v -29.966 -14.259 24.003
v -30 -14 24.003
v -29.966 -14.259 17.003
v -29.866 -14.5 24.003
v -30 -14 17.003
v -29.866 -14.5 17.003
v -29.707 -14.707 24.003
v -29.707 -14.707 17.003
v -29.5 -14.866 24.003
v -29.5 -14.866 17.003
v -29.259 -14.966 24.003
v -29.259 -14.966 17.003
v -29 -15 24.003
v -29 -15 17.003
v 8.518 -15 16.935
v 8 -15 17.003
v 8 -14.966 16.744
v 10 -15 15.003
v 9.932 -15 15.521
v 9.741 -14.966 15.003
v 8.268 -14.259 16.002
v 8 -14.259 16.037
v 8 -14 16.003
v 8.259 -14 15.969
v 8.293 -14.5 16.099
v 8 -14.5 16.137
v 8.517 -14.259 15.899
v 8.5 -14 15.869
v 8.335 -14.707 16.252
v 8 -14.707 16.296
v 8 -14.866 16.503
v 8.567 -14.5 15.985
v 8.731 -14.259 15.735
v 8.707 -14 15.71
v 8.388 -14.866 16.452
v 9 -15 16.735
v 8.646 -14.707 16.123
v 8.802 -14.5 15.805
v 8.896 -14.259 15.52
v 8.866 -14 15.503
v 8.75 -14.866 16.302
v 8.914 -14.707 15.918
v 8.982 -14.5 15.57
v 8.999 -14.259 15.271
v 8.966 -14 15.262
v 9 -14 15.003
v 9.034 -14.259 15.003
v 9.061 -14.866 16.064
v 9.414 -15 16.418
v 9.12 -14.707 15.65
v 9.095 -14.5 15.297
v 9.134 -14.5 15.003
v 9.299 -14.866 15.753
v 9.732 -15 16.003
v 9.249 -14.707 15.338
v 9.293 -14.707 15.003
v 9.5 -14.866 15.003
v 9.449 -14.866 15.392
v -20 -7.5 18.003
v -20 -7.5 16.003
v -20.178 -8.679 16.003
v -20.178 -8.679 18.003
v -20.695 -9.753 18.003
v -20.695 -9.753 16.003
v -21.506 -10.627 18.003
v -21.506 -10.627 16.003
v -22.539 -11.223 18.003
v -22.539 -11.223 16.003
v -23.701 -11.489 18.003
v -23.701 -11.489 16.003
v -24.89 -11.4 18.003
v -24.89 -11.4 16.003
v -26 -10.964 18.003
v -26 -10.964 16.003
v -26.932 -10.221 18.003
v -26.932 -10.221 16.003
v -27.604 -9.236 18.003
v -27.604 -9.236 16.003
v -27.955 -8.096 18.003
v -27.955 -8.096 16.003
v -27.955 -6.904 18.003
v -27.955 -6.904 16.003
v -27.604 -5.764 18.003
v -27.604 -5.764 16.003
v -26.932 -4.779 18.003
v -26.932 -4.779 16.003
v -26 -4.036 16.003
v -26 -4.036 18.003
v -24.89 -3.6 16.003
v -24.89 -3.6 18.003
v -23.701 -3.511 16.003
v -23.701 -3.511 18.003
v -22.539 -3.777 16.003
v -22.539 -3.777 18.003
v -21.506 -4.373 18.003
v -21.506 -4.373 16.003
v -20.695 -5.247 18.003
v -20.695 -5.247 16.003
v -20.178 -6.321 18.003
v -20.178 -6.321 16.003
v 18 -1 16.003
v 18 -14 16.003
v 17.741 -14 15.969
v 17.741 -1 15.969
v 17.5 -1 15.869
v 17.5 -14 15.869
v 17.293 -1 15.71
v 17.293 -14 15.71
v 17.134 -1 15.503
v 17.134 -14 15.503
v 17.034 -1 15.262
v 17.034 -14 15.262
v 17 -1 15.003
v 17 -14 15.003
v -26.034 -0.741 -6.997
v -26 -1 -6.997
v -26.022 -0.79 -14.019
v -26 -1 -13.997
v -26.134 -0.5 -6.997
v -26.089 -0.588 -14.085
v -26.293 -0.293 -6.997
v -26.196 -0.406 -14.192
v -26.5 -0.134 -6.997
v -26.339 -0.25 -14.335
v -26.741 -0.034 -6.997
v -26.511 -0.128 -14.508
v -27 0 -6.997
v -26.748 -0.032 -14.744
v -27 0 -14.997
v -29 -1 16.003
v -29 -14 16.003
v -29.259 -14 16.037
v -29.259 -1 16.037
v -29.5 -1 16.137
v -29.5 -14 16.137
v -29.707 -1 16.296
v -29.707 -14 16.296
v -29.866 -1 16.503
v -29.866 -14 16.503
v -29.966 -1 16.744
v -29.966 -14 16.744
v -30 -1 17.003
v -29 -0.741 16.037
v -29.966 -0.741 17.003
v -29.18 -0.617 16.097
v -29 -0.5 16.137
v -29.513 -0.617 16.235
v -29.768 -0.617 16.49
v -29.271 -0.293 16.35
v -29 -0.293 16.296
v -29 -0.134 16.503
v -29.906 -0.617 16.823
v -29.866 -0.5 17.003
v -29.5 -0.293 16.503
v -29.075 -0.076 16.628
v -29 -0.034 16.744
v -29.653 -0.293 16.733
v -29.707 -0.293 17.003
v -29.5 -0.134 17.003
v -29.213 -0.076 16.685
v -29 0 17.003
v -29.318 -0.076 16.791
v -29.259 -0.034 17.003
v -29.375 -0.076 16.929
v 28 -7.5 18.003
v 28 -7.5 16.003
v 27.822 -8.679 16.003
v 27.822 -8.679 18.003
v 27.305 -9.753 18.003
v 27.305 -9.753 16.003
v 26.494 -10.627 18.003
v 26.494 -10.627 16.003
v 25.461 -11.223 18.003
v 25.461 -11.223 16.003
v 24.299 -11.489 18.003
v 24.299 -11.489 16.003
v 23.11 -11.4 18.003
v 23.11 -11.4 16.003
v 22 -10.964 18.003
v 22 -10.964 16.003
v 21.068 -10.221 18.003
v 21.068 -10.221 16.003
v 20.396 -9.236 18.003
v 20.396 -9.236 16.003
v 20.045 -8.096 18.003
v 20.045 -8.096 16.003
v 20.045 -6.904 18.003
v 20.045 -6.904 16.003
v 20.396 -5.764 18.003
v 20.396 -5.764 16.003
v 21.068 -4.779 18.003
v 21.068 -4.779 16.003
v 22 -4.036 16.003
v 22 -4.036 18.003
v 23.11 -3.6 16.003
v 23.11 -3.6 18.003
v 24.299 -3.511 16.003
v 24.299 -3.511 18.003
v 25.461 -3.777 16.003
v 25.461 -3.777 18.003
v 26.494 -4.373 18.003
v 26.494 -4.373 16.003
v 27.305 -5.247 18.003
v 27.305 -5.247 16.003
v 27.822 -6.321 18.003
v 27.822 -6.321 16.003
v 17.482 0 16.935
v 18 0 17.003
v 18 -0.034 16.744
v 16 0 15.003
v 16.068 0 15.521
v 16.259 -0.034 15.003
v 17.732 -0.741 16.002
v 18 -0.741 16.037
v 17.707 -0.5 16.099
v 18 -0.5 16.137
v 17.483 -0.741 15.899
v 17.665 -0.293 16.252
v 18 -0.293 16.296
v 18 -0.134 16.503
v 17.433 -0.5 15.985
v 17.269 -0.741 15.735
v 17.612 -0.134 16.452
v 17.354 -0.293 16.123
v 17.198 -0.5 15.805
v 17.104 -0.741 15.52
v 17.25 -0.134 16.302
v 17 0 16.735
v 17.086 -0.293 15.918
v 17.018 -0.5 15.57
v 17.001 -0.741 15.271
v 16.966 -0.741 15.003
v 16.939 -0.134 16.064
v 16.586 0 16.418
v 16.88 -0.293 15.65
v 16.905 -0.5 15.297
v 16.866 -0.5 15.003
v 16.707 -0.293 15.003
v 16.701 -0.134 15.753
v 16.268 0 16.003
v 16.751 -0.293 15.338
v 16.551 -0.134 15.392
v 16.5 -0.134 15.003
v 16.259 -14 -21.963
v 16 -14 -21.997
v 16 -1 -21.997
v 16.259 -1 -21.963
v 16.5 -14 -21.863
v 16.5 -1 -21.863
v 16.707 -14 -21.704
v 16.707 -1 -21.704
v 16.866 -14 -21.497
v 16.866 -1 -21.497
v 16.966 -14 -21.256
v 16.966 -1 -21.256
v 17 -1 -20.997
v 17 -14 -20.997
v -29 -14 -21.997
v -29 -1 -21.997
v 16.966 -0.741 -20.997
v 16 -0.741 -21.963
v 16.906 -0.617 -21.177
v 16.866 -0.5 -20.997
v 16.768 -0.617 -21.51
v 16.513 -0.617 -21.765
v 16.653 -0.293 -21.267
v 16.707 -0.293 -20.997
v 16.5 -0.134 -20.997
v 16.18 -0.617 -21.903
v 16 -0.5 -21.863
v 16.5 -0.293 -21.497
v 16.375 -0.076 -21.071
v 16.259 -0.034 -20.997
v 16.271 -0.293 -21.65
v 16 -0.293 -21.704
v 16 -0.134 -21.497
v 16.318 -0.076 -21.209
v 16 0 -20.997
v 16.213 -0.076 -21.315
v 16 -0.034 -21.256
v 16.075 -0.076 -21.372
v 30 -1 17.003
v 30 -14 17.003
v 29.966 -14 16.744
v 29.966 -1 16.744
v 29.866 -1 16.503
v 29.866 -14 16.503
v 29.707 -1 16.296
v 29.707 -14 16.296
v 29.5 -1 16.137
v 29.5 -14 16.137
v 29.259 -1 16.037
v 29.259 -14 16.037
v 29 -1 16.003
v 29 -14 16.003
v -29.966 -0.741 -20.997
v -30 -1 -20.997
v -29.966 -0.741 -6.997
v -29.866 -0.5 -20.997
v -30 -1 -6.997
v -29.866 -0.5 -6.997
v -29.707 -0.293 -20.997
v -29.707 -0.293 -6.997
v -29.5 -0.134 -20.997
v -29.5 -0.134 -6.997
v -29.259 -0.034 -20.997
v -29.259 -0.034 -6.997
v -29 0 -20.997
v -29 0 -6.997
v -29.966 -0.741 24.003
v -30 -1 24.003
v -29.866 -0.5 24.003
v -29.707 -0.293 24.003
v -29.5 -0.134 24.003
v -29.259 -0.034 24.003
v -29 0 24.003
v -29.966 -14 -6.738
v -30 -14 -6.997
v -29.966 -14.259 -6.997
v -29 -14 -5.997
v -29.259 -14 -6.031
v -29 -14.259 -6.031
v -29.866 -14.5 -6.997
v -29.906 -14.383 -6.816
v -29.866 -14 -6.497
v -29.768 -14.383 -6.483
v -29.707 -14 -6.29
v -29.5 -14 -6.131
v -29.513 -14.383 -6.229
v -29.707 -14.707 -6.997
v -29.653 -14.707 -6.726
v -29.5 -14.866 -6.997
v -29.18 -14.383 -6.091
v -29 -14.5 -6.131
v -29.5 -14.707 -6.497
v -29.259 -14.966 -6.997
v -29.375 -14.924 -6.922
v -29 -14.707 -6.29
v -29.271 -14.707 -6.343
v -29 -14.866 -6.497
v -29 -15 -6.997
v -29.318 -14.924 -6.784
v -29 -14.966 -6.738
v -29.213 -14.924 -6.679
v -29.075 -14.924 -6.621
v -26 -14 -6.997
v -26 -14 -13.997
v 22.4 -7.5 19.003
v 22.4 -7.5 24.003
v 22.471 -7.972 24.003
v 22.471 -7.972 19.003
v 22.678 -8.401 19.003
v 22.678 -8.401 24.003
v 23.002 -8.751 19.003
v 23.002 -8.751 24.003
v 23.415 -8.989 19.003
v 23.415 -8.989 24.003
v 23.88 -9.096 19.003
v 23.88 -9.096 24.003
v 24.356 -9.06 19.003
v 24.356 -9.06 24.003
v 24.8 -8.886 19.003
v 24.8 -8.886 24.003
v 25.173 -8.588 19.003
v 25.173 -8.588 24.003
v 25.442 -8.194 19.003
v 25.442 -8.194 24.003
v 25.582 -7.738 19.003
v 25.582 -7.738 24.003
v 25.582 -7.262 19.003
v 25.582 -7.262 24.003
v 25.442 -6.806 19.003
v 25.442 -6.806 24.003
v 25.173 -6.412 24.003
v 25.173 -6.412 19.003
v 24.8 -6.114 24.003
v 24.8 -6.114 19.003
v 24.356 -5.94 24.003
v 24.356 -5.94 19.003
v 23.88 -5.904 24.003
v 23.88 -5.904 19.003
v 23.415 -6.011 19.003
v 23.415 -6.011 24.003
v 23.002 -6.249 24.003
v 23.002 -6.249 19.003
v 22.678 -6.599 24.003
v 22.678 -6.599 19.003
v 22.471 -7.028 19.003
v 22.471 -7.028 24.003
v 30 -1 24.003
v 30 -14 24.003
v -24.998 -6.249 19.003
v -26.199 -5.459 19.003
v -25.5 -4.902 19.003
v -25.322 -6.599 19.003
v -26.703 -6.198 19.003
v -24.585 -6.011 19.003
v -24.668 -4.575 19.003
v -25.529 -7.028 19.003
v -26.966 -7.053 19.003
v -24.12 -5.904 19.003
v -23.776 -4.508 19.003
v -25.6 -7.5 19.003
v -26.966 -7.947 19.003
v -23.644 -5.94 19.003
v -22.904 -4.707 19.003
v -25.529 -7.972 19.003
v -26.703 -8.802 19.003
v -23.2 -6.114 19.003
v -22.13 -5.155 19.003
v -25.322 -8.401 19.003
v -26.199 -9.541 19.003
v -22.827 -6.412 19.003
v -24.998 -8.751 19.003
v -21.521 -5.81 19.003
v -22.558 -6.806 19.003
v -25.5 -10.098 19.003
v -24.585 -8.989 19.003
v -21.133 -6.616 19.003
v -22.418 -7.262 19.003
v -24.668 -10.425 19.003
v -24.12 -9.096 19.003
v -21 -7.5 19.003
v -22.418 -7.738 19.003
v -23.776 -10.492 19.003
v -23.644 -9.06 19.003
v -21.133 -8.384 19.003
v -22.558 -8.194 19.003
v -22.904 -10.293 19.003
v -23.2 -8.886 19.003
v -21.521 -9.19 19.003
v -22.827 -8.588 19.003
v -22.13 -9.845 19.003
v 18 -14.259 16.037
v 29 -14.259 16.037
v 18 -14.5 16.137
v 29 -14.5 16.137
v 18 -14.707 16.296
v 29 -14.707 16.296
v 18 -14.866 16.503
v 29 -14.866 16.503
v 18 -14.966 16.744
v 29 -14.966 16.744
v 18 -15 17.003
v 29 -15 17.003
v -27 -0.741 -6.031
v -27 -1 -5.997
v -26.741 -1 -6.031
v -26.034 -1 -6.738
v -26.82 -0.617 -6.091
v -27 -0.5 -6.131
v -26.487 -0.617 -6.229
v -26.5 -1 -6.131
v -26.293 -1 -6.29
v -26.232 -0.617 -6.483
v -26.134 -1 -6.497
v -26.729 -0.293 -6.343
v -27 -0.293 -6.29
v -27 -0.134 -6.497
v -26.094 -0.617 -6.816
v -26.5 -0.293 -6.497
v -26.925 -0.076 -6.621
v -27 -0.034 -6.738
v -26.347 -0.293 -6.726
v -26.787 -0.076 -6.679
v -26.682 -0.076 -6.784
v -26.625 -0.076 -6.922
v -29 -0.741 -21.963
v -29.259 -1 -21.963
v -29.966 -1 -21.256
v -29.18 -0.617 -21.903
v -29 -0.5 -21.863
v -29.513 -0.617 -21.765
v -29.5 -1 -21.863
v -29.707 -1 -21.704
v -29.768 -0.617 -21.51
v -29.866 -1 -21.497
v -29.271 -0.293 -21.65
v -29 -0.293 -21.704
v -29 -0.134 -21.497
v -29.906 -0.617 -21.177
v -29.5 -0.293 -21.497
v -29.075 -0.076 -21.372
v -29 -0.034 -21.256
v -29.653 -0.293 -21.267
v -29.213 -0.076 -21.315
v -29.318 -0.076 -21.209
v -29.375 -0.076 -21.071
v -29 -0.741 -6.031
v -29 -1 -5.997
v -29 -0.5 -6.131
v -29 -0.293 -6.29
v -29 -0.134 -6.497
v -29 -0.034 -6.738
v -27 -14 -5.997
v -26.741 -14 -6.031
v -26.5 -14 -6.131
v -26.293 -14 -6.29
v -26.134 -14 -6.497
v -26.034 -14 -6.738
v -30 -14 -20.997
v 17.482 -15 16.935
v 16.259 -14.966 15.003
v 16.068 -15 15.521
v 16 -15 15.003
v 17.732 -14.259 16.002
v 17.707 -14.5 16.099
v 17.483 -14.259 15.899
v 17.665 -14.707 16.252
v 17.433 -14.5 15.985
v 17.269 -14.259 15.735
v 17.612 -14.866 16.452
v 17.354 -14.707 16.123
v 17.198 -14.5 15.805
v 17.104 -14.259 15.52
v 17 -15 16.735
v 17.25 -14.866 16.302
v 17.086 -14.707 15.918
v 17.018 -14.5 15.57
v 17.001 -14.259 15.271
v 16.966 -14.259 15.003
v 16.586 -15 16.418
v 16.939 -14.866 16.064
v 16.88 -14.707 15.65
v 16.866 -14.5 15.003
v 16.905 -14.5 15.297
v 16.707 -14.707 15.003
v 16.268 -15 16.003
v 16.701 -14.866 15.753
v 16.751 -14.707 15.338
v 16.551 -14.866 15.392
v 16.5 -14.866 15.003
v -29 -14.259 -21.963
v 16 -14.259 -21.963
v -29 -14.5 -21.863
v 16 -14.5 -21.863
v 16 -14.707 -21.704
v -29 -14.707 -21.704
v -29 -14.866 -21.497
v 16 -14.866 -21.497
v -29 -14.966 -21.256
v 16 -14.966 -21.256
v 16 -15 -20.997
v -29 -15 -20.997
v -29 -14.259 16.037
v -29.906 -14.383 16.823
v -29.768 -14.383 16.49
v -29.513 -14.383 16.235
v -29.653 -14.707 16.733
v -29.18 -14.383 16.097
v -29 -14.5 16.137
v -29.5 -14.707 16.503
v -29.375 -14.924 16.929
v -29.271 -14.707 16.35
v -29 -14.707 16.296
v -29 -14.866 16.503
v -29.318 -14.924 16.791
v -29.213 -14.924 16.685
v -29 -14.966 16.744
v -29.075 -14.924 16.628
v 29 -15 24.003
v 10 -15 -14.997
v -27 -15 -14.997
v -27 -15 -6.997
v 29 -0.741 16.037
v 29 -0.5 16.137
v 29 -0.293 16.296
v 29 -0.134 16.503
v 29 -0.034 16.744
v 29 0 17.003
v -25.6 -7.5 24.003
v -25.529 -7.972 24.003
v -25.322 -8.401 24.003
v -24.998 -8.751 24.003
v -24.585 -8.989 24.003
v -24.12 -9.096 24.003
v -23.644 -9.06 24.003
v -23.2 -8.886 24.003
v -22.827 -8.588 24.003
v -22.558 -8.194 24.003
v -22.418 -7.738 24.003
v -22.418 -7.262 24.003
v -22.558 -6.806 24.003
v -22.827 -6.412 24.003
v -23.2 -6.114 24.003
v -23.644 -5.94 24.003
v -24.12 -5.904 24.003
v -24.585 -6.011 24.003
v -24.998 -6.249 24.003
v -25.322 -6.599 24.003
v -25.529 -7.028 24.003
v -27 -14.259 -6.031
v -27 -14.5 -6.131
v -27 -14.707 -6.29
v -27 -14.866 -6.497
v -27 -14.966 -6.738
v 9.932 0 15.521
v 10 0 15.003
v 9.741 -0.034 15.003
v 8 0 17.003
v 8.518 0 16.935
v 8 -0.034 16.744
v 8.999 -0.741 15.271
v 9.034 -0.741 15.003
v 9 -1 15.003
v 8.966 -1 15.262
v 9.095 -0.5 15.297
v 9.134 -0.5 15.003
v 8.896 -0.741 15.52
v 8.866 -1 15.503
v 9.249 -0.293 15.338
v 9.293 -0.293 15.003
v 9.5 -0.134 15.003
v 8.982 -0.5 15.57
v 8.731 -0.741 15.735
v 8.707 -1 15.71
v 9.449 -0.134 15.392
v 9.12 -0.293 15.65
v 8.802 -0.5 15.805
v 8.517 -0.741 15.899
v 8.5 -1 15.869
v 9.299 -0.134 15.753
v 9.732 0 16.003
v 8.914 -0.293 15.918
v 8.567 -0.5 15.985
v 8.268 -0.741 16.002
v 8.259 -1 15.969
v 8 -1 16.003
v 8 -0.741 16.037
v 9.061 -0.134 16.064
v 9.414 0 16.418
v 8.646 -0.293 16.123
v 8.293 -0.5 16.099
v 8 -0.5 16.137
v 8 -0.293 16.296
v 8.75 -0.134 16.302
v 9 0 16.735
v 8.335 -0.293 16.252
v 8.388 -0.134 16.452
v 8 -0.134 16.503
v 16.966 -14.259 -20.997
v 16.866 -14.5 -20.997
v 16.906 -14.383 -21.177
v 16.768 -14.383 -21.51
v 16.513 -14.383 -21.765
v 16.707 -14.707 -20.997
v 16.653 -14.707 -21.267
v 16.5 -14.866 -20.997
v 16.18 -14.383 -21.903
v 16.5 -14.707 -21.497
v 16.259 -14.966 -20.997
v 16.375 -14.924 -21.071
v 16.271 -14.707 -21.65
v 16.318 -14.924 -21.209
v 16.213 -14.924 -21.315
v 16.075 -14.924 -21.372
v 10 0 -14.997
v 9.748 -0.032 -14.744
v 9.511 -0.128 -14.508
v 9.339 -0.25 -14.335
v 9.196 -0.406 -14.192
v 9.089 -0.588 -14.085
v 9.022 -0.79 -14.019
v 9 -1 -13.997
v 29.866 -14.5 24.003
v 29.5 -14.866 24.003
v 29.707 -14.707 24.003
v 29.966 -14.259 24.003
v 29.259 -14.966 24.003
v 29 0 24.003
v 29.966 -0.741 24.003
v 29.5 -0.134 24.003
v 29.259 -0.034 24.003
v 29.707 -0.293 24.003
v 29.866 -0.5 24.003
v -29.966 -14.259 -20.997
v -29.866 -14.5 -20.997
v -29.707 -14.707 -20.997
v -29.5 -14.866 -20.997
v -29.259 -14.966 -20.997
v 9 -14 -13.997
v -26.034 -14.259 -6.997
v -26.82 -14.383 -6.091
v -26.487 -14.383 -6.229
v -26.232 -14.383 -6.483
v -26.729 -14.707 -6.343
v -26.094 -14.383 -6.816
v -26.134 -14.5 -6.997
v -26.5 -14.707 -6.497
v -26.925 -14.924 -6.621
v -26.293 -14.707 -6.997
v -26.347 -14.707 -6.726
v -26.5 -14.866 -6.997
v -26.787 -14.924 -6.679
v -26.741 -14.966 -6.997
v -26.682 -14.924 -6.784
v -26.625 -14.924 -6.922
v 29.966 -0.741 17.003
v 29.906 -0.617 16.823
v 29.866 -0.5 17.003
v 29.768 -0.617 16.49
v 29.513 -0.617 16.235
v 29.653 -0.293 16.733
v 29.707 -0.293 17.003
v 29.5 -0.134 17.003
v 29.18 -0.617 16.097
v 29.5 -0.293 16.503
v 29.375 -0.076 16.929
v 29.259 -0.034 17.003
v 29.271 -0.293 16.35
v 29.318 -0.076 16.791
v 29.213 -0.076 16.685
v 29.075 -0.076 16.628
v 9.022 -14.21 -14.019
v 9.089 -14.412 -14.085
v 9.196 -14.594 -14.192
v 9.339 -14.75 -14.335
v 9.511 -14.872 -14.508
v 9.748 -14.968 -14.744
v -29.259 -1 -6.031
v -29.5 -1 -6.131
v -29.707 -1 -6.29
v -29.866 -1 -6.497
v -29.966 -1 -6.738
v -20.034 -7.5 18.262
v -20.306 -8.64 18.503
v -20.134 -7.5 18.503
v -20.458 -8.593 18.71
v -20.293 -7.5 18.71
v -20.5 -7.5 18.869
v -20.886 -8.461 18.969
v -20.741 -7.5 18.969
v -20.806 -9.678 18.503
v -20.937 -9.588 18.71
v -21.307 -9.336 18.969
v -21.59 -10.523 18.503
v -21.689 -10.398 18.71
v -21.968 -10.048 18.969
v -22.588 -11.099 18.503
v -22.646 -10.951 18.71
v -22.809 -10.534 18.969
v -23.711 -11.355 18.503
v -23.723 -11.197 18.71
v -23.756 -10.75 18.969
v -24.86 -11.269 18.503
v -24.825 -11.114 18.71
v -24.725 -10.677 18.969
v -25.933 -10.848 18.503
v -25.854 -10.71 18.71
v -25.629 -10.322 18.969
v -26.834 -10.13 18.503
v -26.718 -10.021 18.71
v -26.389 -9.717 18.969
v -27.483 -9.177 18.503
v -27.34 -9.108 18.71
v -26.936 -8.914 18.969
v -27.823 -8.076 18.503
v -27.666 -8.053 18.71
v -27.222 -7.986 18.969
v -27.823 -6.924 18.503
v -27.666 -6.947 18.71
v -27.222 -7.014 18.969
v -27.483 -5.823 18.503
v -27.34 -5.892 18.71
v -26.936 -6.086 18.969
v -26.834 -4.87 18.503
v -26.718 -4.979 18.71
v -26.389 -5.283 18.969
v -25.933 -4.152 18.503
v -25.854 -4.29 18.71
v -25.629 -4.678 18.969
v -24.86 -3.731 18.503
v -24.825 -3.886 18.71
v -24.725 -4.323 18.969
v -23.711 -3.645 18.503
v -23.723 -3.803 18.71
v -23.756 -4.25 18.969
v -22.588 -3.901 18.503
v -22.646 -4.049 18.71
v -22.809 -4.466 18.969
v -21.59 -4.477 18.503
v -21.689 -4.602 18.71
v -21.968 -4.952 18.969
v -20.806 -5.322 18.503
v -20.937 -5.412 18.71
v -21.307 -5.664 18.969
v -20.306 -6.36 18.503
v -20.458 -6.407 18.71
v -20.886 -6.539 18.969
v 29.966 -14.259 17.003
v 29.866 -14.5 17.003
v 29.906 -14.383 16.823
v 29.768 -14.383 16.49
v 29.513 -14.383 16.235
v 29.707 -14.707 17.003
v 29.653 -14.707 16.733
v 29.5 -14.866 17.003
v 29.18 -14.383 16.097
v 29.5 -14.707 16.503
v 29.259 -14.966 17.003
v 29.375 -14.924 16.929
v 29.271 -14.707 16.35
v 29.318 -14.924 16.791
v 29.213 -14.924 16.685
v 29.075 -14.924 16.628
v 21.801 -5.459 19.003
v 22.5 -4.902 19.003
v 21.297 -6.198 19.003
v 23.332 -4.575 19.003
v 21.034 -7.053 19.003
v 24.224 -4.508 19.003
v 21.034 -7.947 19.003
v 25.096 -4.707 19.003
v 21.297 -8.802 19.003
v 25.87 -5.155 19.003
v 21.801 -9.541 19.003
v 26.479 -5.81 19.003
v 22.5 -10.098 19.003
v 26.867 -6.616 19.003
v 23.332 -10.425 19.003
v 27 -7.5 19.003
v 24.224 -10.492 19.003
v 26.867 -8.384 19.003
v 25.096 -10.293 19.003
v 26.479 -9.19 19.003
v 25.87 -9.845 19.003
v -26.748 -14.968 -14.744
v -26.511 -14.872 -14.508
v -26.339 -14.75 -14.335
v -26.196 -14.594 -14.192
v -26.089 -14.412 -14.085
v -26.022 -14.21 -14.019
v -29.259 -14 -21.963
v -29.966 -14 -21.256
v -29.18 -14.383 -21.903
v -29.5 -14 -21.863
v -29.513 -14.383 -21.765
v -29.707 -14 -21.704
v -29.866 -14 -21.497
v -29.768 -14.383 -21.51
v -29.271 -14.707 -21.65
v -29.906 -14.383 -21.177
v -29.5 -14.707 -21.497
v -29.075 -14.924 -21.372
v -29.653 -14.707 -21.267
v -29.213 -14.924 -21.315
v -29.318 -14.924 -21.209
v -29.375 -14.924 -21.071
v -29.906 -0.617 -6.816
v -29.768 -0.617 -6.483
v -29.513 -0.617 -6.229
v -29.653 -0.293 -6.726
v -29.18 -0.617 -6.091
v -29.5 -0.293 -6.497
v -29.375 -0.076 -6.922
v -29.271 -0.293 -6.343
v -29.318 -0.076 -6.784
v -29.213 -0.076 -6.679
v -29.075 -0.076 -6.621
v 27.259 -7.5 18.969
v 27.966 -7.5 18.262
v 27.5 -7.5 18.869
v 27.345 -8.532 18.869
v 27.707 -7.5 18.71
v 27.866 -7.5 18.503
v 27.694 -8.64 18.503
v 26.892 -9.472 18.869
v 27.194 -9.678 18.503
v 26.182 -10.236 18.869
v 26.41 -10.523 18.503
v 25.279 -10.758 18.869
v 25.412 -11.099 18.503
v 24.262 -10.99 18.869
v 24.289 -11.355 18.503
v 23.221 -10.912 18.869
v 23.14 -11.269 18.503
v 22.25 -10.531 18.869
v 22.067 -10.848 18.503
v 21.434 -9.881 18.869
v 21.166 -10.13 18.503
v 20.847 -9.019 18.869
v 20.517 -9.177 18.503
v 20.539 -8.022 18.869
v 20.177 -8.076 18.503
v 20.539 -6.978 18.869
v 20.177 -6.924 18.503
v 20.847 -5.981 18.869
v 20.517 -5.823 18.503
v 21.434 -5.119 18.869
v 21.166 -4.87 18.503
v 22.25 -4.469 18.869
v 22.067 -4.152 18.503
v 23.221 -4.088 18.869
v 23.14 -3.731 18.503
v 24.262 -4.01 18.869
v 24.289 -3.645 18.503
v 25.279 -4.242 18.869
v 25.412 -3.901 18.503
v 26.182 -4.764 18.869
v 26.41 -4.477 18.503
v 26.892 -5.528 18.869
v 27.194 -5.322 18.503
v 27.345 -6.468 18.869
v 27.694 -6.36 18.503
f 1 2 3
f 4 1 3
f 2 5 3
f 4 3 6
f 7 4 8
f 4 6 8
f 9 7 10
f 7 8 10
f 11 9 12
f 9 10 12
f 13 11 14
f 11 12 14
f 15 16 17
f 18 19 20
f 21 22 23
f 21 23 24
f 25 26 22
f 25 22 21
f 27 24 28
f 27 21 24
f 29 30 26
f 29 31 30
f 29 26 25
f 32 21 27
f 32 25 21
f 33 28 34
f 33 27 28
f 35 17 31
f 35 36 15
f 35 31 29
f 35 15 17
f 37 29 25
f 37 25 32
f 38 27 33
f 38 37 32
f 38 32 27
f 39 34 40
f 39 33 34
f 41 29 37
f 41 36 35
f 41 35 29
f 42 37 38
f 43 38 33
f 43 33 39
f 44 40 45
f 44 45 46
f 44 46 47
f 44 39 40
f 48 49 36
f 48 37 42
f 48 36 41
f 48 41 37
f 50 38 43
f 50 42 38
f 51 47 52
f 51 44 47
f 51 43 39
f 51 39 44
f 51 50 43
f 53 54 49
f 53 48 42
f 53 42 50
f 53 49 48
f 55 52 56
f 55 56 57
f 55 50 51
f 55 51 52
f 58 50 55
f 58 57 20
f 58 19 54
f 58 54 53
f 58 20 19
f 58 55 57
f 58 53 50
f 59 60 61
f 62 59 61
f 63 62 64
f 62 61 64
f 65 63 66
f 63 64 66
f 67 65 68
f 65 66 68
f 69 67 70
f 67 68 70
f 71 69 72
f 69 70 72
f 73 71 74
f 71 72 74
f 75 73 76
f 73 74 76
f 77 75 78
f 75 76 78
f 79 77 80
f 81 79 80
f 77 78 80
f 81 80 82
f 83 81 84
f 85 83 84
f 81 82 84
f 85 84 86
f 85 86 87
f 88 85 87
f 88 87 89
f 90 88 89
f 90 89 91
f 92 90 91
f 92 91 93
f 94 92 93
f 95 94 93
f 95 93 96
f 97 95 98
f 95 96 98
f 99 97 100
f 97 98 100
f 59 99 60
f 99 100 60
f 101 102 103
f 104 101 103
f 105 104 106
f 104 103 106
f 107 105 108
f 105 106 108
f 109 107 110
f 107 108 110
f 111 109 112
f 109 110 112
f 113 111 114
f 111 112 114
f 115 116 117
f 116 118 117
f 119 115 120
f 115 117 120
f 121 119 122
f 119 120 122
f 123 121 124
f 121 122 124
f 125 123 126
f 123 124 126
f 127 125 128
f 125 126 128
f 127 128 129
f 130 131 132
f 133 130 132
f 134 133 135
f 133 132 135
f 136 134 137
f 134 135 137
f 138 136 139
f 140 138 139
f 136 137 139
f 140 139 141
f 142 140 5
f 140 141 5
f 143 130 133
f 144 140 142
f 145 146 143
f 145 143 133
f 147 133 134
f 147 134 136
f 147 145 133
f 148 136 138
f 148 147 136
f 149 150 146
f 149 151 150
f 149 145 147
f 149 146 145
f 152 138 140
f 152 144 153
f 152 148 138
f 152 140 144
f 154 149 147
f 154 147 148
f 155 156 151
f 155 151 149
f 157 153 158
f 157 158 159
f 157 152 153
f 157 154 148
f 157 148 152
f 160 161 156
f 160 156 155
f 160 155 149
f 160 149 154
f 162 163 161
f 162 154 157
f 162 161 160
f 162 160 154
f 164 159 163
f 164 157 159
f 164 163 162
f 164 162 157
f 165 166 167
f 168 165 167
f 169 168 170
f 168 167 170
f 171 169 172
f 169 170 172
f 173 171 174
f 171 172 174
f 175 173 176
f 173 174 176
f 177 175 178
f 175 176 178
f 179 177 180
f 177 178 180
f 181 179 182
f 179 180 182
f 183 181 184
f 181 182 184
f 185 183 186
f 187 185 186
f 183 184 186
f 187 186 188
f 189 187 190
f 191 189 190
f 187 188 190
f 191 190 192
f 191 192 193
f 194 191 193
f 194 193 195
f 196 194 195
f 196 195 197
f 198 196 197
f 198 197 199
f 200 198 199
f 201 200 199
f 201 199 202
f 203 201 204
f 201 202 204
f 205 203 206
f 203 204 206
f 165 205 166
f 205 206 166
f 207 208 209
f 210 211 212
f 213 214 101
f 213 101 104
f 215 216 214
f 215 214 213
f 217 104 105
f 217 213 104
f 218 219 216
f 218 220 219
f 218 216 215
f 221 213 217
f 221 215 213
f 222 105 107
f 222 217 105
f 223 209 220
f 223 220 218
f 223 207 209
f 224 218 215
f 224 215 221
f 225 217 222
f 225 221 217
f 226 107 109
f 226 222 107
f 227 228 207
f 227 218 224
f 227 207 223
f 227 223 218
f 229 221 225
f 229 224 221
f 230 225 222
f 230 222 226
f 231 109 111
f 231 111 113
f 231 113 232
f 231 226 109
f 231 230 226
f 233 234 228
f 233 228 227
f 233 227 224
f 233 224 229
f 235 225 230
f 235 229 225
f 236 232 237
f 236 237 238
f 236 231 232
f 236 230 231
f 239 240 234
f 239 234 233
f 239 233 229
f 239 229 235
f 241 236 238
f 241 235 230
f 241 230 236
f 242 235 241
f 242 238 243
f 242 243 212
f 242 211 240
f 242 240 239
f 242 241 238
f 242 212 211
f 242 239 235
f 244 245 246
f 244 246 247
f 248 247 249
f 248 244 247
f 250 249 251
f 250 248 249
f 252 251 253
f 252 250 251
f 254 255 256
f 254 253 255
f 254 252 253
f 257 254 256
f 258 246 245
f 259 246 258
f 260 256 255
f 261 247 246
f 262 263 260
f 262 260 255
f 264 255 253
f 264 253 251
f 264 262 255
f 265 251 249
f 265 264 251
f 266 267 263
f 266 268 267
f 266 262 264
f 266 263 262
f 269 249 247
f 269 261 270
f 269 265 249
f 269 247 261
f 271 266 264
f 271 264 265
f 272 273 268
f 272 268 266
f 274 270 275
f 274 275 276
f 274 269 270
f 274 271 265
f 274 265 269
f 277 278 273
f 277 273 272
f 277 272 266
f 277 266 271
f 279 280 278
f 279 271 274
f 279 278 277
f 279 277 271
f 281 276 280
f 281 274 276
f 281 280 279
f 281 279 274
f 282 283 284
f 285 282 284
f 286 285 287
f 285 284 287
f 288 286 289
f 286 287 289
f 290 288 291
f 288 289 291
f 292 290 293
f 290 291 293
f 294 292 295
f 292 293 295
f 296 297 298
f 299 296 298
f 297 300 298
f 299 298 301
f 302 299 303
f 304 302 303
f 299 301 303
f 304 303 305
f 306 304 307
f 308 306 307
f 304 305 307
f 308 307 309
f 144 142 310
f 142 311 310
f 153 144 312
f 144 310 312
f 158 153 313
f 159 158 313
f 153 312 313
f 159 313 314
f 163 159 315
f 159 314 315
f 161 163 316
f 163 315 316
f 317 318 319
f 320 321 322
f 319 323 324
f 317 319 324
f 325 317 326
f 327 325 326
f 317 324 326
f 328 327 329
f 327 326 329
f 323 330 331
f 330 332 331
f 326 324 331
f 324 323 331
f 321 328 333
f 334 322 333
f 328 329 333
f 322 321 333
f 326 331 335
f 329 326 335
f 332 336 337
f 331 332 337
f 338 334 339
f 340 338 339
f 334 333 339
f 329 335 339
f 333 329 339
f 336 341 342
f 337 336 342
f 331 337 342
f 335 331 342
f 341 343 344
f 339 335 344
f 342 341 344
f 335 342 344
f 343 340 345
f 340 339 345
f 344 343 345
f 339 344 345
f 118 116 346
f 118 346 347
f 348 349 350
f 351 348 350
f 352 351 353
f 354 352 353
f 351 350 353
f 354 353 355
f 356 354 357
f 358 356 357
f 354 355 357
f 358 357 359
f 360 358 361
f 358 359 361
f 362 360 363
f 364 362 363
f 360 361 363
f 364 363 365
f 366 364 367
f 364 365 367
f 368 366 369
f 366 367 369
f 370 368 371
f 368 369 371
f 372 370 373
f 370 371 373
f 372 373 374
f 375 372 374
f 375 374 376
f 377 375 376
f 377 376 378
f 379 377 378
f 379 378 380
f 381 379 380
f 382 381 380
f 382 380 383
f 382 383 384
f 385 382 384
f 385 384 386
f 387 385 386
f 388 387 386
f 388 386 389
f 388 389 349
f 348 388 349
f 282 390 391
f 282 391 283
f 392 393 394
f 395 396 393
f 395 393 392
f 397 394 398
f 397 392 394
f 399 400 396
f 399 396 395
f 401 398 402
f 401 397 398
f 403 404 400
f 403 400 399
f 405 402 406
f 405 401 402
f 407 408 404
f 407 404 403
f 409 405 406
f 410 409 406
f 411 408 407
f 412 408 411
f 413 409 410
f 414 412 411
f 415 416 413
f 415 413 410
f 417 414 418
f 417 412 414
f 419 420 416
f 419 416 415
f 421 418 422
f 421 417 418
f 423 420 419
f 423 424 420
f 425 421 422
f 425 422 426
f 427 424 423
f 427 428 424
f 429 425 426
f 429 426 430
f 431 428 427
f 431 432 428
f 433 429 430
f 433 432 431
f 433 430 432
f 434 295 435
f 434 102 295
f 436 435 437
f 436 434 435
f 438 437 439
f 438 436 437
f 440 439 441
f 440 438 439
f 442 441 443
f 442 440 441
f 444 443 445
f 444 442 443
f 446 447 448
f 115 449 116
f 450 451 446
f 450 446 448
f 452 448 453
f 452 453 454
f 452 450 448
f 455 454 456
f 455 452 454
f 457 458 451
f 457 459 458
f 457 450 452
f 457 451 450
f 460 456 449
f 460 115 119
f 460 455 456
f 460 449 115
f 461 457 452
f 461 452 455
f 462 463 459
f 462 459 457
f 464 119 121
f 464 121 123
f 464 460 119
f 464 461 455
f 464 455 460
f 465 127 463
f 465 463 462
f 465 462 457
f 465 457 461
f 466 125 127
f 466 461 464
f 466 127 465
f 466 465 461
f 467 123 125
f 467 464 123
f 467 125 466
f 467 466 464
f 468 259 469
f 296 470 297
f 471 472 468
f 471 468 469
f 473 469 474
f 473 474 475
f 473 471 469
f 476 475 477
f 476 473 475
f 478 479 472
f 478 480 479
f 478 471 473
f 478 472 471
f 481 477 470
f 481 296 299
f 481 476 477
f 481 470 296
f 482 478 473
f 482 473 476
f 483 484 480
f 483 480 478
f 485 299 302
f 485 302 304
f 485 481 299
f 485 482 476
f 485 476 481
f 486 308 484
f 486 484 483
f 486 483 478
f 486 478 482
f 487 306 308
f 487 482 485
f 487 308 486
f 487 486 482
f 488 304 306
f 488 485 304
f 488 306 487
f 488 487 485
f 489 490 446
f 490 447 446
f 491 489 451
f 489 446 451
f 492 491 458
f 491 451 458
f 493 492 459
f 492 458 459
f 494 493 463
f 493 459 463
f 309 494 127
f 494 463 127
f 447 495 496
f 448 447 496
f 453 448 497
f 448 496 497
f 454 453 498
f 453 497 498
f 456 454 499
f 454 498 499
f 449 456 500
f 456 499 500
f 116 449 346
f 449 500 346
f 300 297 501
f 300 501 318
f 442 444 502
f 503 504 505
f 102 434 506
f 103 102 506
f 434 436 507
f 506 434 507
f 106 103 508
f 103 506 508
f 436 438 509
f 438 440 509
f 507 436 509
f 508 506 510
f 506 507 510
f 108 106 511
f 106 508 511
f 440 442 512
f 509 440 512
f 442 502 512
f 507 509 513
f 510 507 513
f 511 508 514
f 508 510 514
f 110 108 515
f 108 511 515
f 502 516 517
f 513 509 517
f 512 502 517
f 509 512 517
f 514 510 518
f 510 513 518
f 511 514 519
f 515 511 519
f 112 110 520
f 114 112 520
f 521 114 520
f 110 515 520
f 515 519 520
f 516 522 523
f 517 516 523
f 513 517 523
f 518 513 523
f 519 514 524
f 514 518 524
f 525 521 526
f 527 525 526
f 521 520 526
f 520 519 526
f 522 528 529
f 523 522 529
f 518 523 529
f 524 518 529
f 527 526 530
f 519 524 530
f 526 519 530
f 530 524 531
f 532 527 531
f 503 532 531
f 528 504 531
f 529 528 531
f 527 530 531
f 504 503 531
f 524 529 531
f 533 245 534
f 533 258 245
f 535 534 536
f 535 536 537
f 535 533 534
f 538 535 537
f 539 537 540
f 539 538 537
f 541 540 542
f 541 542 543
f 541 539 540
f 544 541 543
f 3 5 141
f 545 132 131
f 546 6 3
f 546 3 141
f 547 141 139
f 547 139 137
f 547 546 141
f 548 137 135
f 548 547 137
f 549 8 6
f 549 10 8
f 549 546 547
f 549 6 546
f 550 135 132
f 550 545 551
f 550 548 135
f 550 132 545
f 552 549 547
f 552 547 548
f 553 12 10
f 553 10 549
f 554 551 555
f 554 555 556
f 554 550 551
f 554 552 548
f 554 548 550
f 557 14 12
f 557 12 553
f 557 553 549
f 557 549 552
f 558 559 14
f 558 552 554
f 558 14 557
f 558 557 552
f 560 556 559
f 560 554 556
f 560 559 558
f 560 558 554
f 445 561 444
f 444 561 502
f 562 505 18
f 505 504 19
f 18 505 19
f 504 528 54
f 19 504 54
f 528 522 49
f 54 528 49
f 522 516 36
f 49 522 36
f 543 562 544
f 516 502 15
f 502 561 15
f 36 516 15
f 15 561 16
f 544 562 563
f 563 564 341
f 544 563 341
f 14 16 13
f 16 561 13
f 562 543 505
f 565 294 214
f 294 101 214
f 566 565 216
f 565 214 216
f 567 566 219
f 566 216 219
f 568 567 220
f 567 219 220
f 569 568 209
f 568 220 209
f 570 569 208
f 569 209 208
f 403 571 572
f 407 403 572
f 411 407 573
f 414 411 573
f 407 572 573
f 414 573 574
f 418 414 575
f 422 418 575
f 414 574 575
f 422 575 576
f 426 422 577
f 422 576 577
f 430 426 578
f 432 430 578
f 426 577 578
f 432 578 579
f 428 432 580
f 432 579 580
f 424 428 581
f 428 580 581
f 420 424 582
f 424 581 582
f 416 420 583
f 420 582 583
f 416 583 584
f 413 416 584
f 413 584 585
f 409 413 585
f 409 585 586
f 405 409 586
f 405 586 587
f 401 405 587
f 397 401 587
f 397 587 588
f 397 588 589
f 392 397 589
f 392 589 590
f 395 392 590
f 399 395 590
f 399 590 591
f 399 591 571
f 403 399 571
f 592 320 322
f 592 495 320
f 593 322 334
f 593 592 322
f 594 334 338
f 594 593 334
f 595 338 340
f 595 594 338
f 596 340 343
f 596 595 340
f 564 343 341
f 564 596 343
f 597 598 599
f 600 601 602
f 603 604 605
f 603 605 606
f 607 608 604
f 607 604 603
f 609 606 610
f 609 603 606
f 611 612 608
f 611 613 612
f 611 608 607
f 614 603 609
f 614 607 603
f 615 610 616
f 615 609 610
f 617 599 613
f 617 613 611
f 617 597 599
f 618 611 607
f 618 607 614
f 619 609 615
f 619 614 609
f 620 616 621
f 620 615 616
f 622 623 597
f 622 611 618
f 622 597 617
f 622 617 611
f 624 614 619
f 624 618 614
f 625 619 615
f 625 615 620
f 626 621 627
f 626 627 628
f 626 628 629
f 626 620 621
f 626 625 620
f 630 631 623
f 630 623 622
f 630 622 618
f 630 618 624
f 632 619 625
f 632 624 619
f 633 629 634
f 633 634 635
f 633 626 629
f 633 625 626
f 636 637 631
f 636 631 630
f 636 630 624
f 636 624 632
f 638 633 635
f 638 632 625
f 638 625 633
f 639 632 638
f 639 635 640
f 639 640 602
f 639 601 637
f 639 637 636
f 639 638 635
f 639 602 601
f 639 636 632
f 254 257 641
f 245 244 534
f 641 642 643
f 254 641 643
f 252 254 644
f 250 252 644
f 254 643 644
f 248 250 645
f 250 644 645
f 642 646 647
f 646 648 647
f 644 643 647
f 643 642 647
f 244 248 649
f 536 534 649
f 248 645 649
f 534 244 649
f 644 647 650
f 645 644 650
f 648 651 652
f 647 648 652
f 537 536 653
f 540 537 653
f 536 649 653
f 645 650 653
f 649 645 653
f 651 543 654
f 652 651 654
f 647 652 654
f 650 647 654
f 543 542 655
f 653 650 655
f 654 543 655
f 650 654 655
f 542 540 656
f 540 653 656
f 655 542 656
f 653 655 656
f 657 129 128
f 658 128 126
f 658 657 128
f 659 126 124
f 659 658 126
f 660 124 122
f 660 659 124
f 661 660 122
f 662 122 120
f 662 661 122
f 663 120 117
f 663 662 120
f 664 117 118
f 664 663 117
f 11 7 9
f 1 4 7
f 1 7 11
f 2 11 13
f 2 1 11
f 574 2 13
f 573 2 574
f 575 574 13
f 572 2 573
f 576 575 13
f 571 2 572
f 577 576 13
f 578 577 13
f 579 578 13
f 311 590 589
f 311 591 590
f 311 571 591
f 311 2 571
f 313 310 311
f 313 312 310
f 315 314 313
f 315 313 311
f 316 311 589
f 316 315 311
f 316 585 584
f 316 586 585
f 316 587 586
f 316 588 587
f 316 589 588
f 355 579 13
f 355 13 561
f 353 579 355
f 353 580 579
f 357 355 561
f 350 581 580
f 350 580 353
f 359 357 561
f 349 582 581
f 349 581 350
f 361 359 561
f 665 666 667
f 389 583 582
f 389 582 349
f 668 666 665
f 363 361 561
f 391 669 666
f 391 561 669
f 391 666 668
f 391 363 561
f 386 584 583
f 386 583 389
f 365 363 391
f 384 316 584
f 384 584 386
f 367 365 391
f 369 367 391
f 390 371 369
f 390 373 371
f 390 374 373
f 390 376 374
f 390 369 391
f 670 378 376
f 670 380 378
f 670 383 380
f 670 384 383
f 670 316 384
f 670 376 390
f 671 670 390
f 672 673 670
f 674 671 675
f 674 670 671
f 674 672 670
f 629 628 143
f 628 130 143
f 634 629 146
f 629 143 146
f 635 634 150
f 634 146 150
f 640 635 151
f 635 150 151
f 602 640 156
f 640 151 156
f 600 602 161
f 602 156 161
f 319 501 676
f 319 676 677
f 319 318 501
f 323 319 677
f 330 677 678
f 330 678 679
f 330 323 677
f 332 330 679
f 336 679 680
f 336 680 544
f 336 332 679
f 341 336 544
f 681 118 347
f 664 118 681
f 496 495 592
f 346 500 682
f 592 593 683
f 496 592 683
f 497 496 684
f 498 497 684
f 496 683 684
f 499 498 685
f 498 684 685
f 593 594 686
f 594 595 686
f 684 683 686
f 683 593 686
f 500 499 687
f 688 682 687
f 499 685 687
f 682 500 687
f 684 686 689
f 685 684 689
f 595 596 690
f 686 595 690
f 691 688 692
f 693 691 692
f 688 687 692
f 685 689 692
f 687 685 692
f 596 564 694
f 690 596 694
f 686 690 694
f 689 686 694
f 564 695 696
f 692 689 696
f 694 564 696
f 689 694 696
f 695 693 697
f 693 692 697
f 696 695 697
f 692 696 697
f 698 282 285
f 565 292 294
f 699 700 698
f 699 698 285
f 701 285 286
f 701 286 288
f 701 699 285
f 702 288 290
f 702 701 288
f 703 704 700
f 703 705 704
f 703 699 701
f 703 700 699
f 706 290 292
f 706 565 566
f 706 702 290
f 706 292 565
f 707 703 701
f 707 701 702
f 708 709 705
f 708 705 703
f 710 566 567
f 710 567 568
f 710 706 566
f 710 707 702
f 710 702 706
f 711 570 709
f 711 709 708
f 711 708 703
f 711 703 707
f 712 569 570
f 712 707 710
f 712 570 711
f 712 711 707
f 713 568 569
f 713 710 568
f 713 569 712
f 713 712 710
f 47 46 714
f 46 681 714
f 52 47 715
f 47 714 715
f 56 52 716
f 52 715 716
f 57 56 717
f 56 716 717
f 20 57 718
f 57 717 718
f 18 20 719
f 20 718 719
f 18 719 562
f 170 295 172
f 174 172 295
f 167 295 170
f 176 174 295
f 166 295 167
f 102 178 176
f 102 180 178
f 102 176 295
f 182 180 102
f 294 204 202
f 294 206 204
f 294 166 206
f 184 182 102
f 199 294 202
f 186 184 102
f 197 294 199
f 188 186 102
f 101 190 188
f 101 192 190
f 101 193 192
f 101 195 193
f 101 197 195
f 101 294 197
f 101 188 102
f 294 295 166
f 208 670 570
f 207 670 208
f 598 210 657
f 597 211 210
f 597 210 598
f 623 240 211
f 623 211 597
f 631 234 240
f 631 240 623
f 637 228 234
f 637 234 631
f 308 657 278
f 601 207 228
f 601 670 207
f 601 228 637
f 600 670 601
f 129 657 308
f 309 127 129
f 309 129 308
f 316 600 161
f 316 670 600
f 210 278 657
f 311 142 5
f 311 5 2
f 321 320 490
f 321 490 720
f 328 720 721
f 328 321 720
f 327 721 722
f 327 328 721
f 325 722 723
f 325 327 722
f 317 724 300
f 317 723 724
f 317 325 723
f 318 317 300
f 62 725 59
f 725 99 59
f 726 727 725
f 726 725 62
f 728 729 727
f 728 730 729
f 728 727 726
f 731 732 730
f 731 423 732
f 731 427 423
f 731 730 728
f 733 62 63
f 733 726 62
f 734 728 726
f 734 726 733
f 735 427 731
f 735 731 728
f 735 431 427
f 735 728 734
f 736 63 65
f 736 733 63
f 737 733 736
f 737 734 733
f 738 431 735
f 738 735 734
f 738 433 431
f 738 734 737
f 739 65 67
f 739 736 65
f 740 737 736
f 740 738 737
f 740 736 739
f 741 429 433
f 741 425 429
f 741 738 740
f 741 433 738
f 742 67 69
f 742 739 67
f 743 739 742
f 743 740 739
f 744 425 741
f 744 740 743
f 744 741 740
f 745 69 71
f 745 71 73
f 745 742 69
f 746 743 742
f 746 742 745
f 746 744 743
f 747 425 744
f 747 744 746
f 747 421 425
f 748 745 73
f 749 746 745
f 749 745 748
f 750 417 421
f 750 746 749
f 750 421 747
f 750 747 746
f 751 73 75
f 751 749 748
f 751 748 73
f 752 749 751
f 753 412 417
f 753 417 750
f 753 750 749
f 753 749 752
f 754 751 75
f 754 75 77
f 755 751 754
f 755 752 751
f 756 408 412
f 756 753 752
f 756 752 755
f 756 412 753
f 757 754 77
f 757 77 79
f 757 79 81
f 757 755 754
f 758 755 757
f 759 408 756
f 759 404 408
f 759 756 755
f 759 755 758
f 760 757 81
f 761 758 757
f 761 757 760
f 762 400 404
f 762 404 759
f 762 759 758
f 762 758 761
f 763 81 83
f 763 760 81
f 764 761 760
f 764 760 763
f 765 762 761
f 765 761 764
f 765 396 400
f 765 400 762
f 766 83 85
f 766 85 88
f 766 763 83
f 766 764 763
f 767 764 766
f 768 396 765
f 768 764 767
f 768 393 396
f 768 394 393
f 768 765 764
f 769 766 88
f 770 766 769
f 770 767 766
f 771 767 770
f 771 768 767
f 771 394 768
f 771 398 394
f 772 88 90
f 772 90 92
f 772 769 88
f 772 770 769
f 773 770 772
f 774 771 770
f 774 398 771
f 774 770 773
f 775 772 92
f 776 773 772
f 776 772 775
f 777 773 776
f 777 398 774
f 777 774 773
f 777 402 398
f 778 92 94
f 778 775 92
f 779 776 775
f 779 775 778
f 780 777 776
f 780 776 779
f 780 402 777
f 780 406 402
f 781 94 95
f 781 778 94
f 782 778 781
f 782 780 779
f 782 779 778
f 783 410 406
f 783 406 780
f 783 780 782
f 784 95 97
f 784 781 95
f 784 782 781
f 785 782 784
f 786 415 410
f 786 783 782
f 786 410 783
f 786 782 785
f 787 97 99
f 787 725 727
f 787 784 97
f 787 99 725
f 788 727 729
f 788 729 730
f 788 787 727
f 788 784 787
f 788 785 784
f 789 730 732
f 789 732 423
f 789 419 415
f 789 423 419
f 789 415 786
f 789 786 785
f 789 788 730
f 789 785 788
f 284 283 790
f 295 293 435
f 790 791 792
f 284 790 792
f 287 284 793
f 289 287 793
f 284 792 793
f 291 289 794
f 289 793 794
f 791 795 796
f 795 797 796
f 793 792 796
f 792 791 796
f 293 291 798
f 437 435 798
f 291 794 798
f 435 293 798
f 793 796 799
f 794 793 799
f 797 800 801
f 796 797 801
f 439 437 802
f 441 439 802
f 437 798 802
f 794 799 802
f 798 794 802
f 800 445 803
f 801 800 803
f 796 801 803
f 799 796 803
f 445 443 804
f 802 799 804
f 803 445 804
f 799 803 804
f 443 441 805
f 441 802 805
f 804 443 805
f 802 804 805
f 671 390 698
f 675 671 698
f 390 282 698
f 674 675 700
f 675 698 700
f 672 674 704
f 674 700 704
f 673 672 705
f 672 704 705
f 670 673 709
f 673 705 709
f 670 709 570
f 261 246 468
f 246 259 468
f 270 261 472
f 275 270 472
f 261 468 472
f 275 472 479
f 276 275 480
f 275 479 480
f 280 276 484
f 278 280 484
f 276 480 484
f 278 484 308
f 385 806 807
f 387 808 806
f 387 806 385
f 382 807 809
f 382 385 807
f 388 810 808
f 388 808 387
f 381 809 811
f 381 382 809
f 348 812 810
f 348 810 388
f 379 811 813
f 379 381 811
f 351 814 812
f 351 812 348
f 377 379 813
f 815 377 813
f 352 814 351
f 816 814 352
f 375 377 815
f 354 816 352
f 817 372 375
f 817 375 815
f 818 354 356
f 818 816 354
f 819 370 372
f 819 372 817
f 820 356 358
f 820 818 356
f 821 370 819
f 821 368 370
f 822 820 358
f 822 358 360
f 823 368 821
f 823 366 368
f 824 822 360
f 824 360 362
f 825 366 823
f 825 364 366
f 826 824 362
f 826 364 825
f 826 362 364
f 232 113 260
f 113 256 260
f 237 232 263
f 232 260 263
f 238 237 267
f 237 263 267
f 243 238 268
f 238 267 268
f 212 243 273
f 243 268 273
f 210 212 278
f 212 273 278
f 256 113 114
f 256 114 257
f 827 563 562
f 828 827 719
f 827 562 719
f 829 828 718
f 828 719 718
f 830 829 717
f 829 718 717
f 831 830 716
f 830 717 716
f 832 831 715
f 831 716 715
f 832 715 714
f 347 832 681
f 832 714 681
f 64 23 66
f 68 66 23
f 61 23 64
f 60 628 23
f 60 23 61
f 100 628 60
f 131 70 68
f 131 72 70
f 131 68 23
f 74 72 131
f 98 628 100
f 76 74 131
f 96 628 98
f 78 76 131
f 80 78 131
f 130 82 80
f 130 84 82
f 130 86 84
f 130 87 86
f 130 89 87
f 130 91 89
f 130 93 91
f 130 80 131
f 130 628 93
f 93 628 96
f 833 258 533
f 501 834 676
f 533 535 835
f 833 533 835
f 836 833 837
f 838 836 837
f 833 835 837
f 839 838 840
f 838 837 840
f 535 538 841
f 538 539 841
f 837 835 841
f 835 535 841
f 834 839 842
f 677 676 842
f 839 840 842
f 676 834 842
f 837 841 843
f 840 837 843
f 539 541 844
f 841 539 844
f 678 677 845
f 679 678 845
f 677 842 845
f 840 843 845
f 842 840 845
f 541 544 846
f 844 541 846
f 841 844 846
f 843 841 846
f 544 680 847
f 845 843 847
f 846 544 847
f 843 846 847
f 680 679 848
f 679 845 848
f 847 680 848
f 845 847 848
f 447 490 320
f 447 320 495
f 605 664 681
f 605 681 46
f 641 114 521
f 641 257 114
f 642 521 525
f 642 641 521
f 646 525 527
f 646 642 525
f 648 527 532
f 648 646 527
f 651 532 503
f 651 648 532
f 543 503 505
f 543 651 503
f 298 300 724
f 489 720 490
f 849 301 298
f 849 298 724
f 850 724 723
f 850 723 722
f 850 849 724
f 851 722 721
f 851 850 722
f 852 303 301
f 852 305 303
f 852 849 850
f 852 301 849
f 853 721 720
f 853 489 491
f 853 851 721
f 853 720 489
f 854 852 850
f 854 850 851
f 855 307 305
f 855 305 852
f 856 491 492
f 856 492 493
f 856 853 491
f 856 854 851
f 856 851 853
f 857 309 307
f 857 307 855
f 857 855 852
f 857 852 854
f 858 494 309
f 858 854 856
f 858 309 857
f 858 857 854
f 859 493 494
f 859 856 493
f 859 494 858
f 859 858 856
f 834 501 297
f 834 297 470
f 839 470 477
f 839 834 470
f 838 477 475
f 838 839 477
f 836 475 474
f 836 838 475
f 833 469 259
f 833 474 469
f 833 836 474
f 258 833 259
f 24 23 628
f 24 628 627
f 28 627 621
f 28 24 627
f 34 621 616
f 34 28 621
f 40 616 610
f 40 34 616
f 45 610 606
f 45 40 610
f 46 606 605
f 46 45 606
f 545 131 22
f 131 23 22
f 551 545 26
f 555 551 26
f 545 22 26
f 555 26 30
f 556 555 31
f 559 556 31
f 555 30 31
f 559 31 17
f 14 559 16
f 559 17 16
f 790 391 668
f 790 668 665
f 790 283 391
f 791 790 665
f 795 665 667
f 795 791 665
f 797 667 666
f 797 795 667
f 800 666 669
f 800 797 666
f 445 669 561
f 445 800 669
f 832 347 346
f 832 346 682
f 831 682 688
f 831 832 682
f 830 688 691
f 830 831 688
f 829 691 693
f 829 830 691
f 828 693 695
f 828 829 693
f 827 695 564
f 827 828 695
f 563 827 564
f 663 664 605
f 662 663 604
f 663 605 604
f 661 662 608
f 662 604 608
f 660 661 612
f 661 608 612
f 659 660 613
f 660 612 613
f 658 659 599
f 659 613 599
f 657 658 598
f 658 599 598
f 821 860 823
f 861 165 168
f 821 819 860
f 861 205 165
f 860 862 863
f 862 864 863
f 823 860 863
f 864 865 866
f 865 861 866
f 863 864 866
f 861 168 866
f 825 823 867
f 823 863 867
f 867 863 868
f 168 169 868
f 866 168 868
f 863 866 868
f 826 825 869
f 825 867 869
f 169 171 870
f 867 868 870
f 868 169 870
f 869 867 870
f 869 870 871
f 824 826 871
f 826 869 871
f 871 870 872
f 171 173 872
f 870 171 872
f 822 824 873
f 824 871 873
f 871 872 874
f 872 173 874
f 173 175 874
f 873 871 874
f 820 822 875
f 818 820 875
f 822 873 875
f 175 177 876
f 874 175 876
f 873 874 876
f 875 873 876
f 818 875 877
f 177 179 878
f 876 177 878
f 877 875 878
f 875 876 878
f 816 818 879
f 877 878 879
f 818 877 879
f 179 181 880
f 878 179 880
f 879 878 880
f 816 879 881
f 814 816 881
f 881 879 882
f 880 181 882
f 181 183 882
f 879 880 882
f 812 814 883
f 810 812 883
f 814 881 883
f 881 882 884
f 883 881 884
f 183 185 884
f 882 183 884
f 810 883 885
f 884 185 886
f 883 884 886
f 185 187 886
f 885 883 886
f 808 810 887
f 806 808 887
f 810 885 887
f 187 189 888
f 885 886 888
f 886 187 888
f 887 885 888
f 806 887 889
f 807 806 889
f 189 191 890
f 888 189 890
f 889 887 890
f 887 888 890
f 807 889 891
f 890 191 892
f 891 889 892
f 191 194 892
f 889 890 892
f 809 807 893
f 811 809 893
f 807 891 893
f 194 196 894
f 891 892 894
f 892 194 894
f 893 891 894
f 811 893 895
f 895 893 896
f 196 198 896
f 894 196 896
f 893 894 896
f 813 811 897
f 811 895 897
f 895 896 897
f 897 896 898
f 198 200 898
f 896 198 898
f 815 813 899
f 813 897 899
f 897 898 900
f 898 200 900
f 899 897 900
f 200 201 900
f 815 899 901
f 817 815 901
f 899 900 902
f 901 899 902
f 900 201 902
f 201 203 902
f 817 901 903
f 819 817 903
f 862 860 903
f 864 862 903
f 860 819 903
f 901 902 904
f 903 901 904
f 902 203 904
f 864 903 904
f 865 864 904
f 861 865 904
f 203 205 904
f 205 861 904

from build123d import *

# Parameters (mm, degrees)
PAD_DEPTH       = 15
SKETCH001_R     = 1.6
POCKET_DEPTH    = 8
SKETCH002_R     = 4
POCKET001_DEPTH = 3
FILLET_R        = 1
FILLET001_R     = 1
FILLET002_R     = 1
FILLET003_R     = 1
FILLET004_R     = 1
FILLET005_R     = 1
FILLET006_R     = 1
FILLET007_R     = 1
FILLET008_R     = 1
FILLET009_R     = 1
FILLET010_R     = 1
FILLET011_R     = 1
FILLET012_R     = 1
FILLET013_R     = 1
FILLET014_R     = 1
FILLET015_R     = 1


with BuildPart() as part:
    # Sketch → Pad (new body)
    with BuildSketch(Plane.XZ):
        Polygon((-30, 24.0033), (30, 24.0033), (30, 16.0033), (17, 16.0033), (17, -21.9967), (-30, -21.9967), (-30, -5.9967), (-26, -5.9967), (-26, -13.9967), (9, -13.9967), (9, 16.0033), (-30, 16.0033), align=None)
    extrude(amount=PAD_DEPTH)

    # Sketch001 → Pocket (cut)
    with BuildSketch(Plane(origin=(0, 0, 24.0033), x_dir=(-1, 0, 0), z_dir=(0, 0, 1))):
        with Locations((-24, 7.5)):
            Circle(SKETCH001_R)
        with Locations((24, 7.5)):
            Circle(SKETCH001_R)
    extrude(amount=-POCKET_DEPTH, mode=Mode.SUBTRACT)

    # Sketch002 → Pocket001 (cut)
    with BuildSketch(Plane(origin=(0, 0, 16.0033), x_dir=(1, 0, 0), z_dir=(0, 0, -1))):
        with Locations((24, 7.5)):
            Circle(SKETCH002_R)
        with Locations((-24, 7.5)):
            Circle(SKETCH002_R)
    extrude(amount=-POCKET001_DEPTH, mode=Mode.SUBTRACT)

    # Fillet
    fillet_edges = [part.edges().sort_by_distance(p)[0] for p in [
        (-8.5, -15, -13.9967),
    ]]
    fillet(fillet_edges, radius=FILLET_R)

    # Fillet001
    fillet001_edges = [part.edges().sort_by_distance(p)[0] for p in [
        (-26, -7.5, -5.9967),
    ]]
    fillet(fillet001_edges, radius=FILLET001_R)

    # Fillet002
    fillet002_edges = [part.edges().sort_by_distance(p)[0] for p in [
        (-30, -7.5, -5.9967),
    ]]
    fillet(fillet002_edges, radius=FILLET002_R)

    # Fillet003
    fillet003_edges = [part.edges().sort_by_distance(p)[0] for p in [
        (-30, -7.5, -21.9967),
    ]]
    fillet(fillet003_edges, radius=FILLET003_R)

    # Fillet004
    fillet004_edges = [part.edges().sort_by_distance(p)[0] for p in [
        (17, -7.5, -21.9967),
    ]]
    fillet(fillet004_edges, radius=FILLET004_R)

    # Fillet005
    fillet005_edges = [part.edges().sort_by_distance(p)[0] for p in [
        (-8.5, 0, -13.9967),
    ]]
    fillet(fillet005_edges, radius=FILLET005_R)

    # Fillet006
    fillet006_edges = [part.edges().sort_by_distance(p)[0] for p in [
        (17, -7.5, 16.0033),
    ]]
    fillet(fillet006_edges, radius=FILLET006_R)

    # Fillet007
    fillet007_edges = [part.edges().sort_by_distance(p)[0] for p in [
        (9, -7.5, 16.0033),
    ]]
    fillet(fillet007_edges, radius=FILLET007_R)

    # Fillet008
    fillet008_edges = [part.edges().sort_by_distance(p)[0] for p in [
        (-30, -7.5, 16.0033),
    ]]
    fillet(fillet008_edges, radius=FILLET008_R)

    # Fillet009
    fillet009_edges = [part.edges().sort_by_distance(p)[0] for p in [
        (30, -7.5, 16.0033),
    ]]
    fillet(fillet009_edges, radius=FILLET009_R)

    # Fillet010
    fillet010_edges = [part.edges().sort_by_distance(p)[0] for p in [
        (9, -15, 0.5033),
    ]]
    fillet(fillet010_edges, radius=FILLET010_R)

    # Fillet011
    fillet011_edges = [part.edges().sort_by_distance(p)[0] for p in [
        (9, 0, 0.5033),
    ]]
    fillet(fillet011_edges, radius=FILLET011_R)

    # Fillet012
    fillet012_edges = [part.edges().sort_by_distance(p)[0] for p in [
        (17, -15, -2.9967),
    ]]
    fillet(fillet012_edges, radius=FILLET012_R)

    # Fillet013
    fillet013_edges = [part.edges().sort_by_distance(p)[0] for p in [
        (17, 0, -2.9967),
    ]]
    fillet(fillet013_edges, radius=FILLET013_R)

    # Fillet014
    fillet014_edges = [part.edges().sort_by_distance(p)[0] for p in [
        (-28, -7.5, 19.0033),
    ]]
    fillet(fillet014_edges, radius=FILLET014_R)

    # Fillet015
    fillet015_edges = [part.edges().sort_by_distance(p)[0] for p in [
        (20, -7.5, 19.0033),
    ]]
    fillet(fillet015_edges, radius=FILLET015_R)


solid = part.part
